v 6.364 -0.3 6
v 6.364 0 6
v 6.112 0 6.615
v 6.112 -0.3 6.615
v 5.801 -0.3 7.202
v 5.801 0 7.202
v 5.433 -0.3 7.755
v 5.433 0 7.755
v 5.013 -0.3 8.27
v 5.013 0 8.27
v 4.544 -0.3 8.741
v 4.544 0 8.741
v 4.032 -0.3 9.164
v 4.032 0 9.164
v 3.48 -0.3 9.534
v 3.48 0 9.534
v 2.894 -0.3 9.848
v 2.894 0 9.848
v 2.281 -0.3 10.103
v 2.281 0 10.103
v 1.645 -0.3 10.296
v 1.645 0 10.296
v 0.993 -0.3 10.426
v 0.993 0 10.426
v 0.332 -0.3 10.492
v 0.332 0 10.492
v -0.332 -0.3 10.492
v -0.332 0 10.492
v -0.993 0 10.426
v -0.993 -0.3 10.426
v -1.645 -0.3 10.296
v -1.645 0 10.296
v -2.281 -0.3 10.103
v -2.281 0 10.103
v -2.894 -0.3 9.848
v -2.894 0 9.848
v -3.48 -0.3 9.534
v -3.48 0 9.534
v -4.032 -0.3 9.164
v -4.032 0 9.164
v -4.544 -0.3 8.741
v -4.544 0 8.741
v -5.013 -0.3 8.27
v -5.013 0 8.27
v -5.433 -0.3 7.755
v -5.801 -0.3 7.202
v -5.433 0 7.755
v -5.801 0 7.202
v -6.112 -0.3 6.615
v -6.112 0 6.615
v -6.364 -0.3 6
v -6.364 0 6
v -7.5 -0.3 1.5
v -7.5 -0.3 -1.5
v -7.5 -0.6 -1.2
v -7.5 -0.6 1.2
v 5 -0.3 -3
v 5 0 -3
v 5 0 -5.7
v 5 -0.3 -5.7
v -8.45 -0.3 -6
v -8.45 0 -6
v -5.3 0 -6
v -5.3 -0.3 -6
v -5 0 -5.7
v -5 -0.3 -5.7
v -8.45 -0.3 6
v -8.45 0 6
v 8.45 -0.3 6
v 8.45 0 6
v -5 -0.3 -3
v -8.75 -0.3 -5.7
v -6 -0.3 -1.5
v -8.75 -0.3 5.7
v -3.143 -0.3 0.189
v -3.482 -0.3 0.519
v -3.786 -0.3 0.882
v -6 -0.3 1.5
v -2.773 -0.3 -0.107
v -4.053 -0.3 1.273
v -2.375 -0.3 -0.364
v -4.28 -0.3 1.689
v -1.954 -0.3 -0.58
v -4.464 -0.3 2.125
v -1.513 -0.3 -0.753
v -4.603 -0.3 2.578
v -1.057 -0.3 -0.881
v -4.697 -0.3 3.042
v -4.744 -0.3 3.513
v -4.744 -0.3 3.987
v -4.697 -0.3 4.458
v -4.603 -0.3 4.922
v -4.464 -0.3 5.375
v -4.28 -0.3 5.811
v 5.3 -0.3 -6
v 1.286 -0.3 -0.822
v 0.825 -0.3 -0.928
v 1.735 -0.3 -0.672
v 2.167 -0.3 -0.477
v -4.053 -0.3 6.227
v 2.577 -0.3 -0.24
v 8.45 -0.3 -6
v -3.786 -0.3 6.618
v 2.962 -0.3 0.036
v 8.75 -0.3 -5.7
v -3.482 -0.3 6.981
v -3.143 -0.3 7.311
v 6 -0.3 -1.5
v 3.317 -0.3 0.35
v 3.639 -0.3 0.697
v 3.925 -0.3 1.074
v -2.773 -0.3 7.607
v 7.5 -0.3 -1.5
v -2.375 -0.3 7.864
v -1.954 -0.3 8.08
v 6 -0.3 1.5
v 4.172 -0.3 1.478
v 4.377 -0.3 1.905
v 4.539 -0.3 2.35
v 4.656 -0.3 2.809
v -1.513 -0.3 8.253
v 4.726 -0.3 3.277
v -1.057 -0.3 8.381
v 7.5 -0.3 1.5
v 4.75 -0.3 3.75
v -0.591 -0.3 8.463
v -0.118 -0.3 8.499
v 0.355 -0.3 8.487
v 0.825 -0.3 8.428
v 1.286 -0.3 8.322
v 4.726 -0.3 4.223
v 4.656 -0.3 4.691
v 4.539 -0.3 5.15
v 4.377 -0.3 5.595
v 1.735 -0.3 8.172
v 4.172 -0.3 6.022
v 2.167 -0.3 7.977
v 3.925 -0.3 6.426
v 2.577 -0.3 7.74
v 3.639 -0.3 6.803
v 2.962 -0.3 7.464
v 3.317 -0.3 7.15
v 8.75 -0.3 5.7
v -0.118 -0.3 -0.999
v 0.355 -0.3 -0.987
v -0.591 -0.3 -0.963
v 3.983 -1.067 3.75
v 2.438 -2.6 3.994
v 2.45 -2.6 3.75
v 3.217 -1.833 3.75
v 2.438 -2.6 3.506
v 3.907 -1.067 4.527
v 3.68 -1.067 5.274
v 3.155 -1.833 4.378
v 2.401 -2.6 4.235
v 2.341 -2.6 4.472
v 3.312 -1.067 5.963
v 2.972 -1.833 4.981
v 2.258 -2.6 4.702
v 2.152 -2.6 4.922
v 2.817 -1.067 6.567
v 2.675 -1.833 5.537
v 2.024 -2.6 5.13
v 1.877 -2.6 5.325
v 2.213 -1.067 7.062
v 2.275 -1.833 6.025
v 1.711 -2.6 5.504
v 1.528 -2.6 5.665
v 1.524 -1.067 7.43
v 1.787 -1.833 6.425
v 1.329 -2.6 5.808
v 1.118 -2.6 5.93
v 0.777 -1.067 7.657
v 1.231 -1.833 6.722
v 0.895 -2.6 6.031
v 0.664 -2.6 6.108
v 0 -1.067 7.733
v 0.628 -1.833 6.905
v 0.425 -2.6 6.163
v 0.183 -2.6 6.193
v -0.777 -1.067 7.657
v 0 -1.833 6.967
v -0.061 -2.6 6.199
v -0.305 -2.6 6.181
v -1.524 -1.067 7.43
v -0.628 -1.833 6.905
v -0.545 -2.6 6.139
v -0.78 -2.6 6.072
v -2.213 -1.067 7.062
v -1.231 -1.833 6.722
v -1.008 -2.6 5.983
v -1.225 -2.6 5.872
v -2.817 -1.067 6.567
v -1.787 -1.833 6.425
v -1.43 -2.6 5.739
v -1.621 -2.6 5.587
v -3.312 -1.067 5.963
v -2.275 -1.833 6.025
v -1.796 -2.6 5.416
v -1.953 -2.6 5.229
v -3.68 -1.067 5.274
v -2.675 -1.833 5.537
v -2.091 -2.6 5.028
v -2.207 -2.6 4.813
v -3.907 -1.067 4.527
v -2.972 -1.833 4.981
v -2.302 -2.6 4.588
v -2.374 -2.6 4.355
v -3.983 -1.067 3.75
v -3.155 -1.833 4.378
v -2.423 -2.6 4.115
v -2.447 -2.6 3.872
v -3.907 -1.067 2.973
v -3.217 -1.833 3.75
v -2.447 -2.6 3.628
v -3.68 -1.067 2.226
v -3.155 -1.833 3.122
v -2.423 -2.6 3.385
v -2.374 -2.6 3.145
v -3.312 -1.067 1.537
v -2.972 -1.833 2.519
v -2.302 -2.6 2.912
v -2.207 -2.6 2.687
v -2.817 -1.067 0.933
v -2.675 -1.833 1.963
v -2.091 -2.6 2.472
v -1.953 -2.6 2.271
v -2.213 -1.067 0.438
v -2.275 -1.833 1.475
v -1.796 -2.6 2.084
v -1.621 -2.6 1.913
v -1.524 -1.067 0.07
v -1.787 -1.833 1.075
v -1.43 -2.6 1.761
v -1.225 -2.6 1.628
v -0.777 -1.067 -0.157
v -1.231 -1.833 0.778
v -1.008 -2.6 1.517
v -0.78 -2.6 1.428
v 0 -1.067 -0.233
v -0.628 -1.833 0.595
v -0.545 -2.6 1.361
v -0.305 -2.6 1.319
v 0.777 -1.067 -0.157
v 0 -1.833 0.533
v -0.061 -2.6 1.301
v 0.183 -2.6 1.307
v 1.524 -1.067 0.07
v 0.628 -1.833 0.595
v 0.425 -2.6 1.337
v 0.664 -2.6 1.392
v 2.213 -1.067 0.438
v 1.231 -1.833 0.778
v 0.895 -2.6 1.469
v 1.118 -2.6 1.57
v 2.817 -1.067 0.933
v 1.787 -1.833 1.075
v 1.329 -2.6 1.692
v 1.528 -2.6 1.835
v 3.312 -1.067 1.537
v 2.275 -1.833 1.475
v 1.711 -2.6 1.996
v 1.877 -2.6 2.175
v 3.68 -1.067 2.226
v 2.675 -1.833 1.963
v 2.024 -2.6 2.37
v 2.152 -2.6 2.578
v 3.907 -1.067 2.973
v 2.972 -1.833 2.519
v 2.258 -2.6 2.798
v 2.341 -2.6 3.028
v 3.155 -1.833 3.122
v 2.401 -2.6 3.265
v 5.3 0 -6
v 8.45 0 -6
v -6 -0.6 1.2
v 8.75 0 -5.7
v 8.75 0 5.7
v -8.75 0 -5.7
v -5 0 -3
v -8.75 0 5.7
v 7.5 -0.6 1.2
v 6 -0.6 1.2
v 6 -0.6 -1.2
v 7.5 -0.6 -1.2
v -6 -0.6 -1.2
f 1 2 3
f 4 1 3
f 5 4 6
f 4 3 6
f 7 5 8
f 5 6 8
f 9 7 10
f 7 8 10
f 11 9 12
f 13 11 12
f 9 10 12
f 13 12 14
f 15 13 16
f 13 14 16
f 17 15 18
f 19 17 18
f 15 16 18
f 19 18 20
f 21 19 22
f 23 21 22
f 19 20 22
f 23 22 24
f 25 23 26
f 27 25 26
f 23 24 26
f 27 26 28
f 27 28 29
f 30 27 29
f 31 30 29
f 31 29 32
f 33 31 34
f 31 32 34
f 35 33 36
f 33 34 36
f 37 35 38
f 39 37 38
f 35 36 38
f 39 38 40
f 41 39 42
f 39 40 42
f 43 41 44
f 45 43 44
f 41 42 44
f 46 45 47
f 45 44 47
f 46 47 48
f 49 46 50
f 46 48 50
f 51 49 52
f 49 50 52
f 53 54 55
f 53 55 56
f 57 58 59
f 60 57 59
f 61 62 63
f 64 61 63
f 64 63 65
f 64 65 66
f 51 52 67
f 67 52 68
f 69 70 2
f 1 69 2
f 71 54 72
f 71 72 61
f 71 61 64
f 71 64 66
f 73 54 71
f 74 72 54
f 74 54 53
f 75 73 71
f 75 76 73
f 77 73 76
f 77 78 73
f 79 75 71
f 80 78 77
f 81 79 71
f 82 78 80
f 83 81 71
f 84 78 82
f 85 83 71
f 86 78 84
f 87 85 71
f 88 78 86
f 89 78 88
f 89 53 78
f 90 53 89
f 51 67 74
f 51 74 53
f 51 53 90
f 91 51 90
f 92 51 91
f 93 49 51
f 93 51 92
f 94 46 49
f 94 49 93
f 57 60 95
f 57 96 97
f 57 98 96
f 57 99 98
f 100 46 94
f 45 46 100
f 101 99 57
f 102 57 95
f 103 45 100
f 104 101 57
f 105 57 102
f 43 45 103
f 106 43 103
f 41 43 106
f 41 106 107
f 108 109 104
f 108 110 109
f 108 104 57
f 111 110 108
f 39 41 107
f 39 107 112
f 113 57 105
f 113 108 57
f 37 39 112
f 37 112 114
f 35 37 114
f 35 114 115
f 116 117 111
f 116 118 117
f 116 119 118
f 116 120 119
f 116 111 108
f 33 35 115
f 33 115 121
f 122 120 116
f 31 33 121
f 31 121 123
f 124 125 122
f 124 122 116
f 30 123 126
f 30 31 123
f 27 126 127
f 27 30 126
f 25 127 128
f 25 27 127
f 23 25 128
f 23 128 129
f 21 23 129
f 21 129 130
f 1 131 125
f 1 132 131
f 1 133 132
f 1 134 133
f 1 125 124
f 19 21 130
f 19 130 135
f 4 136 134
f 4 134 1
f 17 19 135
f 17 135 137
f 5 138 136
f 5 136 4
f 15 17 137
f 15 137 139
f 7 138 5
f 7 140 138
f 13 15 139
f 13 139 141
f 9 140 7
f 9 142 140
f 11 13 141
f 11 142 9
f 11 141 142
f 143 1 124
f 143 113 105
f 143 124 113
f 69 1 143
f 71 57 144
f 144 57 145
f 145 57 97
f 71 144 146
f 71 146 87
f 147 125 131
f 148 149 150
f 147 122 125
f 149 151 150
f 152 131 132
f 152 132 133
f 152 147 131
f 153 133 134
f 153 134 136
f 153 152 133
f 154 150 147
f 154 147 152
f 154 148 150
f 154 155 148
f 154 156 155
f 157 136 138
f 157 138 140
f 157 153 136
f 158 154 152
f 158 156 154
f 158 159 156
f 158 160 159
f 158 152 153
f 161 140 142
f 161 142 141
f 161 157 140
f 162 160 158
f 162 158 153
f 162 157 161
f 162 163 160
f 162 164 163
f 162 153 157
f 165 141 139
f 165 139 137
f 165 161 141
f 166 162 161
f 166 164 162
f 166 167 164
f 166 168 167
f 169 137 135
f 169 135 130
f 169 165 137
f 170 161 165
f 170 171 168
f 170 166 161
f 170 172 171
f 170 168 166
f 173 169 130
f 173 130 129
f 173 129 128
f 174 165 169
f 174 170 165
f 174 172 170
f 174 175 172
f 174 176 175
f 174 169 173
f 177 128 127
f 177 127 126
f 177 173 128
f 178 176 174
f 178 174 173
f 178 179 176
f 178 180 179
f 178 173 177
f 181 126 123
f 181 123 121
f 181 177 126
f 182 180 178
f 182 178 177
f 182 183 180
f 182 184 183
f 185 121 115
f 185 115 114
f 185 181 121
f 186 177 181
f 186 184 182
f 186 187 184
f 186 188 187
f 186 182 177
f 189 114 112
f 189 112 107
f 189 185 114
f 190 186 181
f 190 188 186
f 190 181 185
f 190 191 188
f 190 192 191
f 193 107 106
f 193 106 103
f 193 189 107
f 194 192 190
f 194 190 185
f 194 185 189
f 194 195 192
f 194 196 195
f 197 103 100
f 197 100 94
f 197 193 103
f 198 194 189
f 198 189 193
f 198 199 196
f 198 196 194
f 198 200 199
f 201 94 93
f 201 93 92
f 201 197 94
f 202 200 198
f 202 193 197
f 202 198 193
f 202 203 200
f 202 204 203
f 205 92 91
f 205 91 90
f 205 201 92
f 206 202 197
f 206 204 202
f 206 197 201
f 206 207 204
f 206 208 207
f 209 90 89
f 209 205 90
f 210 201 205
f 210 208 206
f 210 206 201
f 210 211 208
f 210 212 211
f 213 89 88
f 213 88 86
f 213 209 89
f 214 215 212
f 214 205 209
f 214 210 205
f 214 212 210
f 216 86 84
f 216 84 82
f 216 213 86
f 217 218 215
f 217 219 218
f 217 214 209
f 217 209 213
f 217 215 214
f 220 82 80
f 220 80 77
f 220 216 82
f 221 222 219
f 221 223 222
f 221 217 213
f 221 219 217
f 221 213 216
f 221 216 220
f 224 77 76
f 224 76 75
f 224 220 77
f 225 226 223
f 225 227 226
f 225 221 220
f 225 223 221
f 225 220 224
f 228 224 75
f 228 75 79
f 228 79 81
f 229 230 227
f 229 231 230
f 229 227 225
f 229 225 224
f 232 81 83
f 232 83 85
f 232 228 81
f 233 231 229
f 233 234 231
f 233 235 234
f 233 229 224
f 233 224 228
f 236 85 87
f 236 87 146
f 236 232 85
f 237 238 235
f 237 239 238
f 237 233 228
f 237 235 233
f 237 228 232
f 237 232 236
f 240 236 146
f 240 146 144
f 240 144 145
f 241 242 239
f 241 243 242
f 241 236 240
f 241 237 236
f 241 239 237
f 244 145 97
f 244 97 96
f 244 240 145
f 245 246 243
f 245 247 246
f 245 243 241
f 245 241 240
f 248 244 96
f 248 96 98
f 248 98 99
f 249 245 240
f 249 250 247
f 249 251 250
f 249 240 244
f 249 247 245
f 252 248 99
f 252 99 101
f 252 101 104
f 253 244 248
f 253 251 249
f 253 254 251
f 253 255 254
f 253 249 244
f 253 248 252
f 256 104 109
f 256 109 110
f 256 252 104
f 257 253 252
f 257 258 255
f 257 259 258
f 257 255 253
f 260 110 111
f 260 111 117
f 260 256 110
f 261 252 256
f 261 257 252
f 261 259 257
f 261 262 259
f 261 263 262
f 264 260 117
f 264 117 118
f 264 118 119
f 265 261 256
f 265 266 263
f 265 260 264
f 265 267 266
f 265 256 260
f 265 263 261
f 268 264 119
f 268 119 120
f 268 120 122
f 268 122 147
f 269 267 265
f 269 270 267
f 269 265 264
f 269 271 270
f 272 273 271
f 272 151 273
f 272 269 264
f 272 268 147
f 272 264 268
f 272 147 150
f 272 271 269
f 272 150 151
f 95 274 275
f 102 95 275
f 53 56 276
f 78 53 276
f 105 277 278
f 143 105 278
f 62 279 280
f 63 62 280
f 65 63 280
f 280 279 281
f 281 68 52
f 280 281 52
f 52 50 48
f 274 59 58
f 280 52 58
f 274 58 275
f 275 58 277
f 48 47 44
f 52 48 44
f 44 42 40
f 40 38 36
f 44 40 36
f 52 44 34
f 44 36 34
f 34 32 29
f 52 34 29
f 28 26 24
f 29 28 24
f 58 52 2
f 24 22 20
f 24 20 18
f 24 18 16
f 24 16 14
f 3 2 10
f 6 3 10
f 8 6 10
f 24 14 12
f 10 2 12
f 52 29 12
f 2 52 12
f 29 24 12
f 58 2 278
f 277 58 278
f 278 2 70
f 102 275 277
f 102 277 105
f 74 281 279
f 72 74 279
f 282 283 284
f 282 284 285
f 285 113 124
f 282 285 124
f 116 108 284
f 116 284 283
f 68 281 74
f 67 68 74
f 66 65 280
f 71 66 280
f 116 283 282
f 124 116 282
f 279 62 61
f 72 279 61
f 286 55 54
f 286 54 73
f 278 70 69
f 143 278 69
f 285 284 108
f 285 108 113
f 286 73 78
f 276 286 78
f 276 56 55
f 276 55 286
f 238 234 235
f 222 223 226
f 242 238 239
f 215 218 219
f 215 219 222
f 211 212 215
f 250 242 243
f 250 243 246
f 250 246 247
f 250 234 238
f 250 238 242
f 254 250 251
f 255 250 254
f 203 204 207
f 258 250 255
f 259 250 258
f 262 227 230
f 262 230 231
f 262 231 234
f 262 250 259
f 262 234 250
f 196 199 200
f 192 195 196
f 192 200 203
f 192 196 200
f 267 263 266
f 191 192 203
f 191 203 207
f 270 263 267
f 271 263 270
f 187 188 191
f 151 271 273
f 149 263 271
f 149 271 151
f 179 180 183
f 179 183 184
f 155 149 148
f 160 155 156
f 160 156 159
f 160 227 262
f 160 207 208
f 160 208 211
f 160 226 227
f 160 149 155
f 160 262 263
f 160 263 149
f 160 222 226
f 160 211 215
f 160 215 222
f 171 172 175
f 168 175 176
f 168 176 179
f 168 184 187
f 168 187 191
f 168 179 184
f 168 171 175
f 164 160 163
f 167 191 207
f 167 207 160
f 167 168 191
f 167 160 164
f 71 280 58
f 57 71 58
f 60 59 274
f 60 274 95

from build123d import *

# Parameters (mm, degrees)
F0_W     = 1.5
F0_H     = 3
F1_DEPTH = 0.3
F2_DEPTH = 0.6
F3_R     = 4.75
F4_DEPTH = 2.3
F5_SIZE  = 2.29999
F6_SIZE  = 0.29999


# Not quite as in the source:
# - a fillet or chamfer is up to 0.001 mm smaller than in the source, because OpenCascade refuses the exact size


with BuildPart() as f1:
    # F0 (on Front) → F1 (new body)
    with BuildSketch(Plane.XZ):
        with BuildLine():
            Line((8.75, -6), (8.75, 6))
            Line((8.75, 6), (6.3639610307, 6))
            ThreePointArc((6.3639610307, 6), (0, 10.5), (-6.3639610307, 6))
            Line((-6.3639610307, 6), (-8.75, 6))
            Line((-8.75, 6), (-8.75, -6))
            Line((-8.75, -6), (-5, -6))
            Line((-5, -6), (-5, -3))
            Line((-5, -3), (5, -3))
            Line((5, -3), (5, -6))
            Line((5, -6), (8.75, -6))
        make_face()
        with Locations((-6.75, 0)):
            Rectangle(F0_W, F0_H, mode=Mode.SUBTRACT)
        with Locations((6.75, 0)):
            Rectangle(F0_W, F0_H, mode=Mode.SUBTRACT)
        with Locations((-6.75, 0)):
            Rectangle(F0_W, F0_H)
        with Locations((6.75, 0)):
            Rectangle(F0_W, F0_H)
    extrude(amount=F1_DEPTH)

    # F0 (on Front) → F2 (join)
    with BuildSketch(Plane.XZ):
        with Locations((-6.75, 0)):
            Rectangle(F0_W, F0_H)
        with Locations((6.75, 0)):
            Rectangle(F0_W, F0_H)
    extrude(amount=F2_DEPTH)

    # F3 (on face) → F4 (join)
    with BuildSketch(Plane.XZ.offset(0.3)):
        with Locations((0, 3.75)):
            Circle(F3_R)
    extrude(amount=F4_DEPTH)

    # F5 (size 2.3 in the source; OpenCascade refuses exactly that, so slightly less here)
    f5_edges = [f1.edges().sort_by_distance(p)[0] for p in [
        (-4.75, -2.6, 3.75),
    ]]
    chamfer(f5_edges, length=F5_SIZE)

    # F6 (size 0.3 in the source; OpenCascade refuses exactly that, so slightly less here)
    f6_edges = [f1.edges().sort_by_distance(p)[0] for p in [
        (-6.75, -0.6, -1.5),
        (-6.75, -0.6, 1.5),
        (6.75, -0.6, -1.5),
        (6.75, -0.6, 1.5),
        (-5, -0.15, -6),
        (-8.75, -0.15, -6),
        (5, -0.15, -6),
        (8.75, -0.15, -6),
        (8.75, -0.15, 6),
        (-8.75, -0.15, 6),
    ]]
    chamfer(f6_edges, length=F6_SIZE)


solid = f1.part
